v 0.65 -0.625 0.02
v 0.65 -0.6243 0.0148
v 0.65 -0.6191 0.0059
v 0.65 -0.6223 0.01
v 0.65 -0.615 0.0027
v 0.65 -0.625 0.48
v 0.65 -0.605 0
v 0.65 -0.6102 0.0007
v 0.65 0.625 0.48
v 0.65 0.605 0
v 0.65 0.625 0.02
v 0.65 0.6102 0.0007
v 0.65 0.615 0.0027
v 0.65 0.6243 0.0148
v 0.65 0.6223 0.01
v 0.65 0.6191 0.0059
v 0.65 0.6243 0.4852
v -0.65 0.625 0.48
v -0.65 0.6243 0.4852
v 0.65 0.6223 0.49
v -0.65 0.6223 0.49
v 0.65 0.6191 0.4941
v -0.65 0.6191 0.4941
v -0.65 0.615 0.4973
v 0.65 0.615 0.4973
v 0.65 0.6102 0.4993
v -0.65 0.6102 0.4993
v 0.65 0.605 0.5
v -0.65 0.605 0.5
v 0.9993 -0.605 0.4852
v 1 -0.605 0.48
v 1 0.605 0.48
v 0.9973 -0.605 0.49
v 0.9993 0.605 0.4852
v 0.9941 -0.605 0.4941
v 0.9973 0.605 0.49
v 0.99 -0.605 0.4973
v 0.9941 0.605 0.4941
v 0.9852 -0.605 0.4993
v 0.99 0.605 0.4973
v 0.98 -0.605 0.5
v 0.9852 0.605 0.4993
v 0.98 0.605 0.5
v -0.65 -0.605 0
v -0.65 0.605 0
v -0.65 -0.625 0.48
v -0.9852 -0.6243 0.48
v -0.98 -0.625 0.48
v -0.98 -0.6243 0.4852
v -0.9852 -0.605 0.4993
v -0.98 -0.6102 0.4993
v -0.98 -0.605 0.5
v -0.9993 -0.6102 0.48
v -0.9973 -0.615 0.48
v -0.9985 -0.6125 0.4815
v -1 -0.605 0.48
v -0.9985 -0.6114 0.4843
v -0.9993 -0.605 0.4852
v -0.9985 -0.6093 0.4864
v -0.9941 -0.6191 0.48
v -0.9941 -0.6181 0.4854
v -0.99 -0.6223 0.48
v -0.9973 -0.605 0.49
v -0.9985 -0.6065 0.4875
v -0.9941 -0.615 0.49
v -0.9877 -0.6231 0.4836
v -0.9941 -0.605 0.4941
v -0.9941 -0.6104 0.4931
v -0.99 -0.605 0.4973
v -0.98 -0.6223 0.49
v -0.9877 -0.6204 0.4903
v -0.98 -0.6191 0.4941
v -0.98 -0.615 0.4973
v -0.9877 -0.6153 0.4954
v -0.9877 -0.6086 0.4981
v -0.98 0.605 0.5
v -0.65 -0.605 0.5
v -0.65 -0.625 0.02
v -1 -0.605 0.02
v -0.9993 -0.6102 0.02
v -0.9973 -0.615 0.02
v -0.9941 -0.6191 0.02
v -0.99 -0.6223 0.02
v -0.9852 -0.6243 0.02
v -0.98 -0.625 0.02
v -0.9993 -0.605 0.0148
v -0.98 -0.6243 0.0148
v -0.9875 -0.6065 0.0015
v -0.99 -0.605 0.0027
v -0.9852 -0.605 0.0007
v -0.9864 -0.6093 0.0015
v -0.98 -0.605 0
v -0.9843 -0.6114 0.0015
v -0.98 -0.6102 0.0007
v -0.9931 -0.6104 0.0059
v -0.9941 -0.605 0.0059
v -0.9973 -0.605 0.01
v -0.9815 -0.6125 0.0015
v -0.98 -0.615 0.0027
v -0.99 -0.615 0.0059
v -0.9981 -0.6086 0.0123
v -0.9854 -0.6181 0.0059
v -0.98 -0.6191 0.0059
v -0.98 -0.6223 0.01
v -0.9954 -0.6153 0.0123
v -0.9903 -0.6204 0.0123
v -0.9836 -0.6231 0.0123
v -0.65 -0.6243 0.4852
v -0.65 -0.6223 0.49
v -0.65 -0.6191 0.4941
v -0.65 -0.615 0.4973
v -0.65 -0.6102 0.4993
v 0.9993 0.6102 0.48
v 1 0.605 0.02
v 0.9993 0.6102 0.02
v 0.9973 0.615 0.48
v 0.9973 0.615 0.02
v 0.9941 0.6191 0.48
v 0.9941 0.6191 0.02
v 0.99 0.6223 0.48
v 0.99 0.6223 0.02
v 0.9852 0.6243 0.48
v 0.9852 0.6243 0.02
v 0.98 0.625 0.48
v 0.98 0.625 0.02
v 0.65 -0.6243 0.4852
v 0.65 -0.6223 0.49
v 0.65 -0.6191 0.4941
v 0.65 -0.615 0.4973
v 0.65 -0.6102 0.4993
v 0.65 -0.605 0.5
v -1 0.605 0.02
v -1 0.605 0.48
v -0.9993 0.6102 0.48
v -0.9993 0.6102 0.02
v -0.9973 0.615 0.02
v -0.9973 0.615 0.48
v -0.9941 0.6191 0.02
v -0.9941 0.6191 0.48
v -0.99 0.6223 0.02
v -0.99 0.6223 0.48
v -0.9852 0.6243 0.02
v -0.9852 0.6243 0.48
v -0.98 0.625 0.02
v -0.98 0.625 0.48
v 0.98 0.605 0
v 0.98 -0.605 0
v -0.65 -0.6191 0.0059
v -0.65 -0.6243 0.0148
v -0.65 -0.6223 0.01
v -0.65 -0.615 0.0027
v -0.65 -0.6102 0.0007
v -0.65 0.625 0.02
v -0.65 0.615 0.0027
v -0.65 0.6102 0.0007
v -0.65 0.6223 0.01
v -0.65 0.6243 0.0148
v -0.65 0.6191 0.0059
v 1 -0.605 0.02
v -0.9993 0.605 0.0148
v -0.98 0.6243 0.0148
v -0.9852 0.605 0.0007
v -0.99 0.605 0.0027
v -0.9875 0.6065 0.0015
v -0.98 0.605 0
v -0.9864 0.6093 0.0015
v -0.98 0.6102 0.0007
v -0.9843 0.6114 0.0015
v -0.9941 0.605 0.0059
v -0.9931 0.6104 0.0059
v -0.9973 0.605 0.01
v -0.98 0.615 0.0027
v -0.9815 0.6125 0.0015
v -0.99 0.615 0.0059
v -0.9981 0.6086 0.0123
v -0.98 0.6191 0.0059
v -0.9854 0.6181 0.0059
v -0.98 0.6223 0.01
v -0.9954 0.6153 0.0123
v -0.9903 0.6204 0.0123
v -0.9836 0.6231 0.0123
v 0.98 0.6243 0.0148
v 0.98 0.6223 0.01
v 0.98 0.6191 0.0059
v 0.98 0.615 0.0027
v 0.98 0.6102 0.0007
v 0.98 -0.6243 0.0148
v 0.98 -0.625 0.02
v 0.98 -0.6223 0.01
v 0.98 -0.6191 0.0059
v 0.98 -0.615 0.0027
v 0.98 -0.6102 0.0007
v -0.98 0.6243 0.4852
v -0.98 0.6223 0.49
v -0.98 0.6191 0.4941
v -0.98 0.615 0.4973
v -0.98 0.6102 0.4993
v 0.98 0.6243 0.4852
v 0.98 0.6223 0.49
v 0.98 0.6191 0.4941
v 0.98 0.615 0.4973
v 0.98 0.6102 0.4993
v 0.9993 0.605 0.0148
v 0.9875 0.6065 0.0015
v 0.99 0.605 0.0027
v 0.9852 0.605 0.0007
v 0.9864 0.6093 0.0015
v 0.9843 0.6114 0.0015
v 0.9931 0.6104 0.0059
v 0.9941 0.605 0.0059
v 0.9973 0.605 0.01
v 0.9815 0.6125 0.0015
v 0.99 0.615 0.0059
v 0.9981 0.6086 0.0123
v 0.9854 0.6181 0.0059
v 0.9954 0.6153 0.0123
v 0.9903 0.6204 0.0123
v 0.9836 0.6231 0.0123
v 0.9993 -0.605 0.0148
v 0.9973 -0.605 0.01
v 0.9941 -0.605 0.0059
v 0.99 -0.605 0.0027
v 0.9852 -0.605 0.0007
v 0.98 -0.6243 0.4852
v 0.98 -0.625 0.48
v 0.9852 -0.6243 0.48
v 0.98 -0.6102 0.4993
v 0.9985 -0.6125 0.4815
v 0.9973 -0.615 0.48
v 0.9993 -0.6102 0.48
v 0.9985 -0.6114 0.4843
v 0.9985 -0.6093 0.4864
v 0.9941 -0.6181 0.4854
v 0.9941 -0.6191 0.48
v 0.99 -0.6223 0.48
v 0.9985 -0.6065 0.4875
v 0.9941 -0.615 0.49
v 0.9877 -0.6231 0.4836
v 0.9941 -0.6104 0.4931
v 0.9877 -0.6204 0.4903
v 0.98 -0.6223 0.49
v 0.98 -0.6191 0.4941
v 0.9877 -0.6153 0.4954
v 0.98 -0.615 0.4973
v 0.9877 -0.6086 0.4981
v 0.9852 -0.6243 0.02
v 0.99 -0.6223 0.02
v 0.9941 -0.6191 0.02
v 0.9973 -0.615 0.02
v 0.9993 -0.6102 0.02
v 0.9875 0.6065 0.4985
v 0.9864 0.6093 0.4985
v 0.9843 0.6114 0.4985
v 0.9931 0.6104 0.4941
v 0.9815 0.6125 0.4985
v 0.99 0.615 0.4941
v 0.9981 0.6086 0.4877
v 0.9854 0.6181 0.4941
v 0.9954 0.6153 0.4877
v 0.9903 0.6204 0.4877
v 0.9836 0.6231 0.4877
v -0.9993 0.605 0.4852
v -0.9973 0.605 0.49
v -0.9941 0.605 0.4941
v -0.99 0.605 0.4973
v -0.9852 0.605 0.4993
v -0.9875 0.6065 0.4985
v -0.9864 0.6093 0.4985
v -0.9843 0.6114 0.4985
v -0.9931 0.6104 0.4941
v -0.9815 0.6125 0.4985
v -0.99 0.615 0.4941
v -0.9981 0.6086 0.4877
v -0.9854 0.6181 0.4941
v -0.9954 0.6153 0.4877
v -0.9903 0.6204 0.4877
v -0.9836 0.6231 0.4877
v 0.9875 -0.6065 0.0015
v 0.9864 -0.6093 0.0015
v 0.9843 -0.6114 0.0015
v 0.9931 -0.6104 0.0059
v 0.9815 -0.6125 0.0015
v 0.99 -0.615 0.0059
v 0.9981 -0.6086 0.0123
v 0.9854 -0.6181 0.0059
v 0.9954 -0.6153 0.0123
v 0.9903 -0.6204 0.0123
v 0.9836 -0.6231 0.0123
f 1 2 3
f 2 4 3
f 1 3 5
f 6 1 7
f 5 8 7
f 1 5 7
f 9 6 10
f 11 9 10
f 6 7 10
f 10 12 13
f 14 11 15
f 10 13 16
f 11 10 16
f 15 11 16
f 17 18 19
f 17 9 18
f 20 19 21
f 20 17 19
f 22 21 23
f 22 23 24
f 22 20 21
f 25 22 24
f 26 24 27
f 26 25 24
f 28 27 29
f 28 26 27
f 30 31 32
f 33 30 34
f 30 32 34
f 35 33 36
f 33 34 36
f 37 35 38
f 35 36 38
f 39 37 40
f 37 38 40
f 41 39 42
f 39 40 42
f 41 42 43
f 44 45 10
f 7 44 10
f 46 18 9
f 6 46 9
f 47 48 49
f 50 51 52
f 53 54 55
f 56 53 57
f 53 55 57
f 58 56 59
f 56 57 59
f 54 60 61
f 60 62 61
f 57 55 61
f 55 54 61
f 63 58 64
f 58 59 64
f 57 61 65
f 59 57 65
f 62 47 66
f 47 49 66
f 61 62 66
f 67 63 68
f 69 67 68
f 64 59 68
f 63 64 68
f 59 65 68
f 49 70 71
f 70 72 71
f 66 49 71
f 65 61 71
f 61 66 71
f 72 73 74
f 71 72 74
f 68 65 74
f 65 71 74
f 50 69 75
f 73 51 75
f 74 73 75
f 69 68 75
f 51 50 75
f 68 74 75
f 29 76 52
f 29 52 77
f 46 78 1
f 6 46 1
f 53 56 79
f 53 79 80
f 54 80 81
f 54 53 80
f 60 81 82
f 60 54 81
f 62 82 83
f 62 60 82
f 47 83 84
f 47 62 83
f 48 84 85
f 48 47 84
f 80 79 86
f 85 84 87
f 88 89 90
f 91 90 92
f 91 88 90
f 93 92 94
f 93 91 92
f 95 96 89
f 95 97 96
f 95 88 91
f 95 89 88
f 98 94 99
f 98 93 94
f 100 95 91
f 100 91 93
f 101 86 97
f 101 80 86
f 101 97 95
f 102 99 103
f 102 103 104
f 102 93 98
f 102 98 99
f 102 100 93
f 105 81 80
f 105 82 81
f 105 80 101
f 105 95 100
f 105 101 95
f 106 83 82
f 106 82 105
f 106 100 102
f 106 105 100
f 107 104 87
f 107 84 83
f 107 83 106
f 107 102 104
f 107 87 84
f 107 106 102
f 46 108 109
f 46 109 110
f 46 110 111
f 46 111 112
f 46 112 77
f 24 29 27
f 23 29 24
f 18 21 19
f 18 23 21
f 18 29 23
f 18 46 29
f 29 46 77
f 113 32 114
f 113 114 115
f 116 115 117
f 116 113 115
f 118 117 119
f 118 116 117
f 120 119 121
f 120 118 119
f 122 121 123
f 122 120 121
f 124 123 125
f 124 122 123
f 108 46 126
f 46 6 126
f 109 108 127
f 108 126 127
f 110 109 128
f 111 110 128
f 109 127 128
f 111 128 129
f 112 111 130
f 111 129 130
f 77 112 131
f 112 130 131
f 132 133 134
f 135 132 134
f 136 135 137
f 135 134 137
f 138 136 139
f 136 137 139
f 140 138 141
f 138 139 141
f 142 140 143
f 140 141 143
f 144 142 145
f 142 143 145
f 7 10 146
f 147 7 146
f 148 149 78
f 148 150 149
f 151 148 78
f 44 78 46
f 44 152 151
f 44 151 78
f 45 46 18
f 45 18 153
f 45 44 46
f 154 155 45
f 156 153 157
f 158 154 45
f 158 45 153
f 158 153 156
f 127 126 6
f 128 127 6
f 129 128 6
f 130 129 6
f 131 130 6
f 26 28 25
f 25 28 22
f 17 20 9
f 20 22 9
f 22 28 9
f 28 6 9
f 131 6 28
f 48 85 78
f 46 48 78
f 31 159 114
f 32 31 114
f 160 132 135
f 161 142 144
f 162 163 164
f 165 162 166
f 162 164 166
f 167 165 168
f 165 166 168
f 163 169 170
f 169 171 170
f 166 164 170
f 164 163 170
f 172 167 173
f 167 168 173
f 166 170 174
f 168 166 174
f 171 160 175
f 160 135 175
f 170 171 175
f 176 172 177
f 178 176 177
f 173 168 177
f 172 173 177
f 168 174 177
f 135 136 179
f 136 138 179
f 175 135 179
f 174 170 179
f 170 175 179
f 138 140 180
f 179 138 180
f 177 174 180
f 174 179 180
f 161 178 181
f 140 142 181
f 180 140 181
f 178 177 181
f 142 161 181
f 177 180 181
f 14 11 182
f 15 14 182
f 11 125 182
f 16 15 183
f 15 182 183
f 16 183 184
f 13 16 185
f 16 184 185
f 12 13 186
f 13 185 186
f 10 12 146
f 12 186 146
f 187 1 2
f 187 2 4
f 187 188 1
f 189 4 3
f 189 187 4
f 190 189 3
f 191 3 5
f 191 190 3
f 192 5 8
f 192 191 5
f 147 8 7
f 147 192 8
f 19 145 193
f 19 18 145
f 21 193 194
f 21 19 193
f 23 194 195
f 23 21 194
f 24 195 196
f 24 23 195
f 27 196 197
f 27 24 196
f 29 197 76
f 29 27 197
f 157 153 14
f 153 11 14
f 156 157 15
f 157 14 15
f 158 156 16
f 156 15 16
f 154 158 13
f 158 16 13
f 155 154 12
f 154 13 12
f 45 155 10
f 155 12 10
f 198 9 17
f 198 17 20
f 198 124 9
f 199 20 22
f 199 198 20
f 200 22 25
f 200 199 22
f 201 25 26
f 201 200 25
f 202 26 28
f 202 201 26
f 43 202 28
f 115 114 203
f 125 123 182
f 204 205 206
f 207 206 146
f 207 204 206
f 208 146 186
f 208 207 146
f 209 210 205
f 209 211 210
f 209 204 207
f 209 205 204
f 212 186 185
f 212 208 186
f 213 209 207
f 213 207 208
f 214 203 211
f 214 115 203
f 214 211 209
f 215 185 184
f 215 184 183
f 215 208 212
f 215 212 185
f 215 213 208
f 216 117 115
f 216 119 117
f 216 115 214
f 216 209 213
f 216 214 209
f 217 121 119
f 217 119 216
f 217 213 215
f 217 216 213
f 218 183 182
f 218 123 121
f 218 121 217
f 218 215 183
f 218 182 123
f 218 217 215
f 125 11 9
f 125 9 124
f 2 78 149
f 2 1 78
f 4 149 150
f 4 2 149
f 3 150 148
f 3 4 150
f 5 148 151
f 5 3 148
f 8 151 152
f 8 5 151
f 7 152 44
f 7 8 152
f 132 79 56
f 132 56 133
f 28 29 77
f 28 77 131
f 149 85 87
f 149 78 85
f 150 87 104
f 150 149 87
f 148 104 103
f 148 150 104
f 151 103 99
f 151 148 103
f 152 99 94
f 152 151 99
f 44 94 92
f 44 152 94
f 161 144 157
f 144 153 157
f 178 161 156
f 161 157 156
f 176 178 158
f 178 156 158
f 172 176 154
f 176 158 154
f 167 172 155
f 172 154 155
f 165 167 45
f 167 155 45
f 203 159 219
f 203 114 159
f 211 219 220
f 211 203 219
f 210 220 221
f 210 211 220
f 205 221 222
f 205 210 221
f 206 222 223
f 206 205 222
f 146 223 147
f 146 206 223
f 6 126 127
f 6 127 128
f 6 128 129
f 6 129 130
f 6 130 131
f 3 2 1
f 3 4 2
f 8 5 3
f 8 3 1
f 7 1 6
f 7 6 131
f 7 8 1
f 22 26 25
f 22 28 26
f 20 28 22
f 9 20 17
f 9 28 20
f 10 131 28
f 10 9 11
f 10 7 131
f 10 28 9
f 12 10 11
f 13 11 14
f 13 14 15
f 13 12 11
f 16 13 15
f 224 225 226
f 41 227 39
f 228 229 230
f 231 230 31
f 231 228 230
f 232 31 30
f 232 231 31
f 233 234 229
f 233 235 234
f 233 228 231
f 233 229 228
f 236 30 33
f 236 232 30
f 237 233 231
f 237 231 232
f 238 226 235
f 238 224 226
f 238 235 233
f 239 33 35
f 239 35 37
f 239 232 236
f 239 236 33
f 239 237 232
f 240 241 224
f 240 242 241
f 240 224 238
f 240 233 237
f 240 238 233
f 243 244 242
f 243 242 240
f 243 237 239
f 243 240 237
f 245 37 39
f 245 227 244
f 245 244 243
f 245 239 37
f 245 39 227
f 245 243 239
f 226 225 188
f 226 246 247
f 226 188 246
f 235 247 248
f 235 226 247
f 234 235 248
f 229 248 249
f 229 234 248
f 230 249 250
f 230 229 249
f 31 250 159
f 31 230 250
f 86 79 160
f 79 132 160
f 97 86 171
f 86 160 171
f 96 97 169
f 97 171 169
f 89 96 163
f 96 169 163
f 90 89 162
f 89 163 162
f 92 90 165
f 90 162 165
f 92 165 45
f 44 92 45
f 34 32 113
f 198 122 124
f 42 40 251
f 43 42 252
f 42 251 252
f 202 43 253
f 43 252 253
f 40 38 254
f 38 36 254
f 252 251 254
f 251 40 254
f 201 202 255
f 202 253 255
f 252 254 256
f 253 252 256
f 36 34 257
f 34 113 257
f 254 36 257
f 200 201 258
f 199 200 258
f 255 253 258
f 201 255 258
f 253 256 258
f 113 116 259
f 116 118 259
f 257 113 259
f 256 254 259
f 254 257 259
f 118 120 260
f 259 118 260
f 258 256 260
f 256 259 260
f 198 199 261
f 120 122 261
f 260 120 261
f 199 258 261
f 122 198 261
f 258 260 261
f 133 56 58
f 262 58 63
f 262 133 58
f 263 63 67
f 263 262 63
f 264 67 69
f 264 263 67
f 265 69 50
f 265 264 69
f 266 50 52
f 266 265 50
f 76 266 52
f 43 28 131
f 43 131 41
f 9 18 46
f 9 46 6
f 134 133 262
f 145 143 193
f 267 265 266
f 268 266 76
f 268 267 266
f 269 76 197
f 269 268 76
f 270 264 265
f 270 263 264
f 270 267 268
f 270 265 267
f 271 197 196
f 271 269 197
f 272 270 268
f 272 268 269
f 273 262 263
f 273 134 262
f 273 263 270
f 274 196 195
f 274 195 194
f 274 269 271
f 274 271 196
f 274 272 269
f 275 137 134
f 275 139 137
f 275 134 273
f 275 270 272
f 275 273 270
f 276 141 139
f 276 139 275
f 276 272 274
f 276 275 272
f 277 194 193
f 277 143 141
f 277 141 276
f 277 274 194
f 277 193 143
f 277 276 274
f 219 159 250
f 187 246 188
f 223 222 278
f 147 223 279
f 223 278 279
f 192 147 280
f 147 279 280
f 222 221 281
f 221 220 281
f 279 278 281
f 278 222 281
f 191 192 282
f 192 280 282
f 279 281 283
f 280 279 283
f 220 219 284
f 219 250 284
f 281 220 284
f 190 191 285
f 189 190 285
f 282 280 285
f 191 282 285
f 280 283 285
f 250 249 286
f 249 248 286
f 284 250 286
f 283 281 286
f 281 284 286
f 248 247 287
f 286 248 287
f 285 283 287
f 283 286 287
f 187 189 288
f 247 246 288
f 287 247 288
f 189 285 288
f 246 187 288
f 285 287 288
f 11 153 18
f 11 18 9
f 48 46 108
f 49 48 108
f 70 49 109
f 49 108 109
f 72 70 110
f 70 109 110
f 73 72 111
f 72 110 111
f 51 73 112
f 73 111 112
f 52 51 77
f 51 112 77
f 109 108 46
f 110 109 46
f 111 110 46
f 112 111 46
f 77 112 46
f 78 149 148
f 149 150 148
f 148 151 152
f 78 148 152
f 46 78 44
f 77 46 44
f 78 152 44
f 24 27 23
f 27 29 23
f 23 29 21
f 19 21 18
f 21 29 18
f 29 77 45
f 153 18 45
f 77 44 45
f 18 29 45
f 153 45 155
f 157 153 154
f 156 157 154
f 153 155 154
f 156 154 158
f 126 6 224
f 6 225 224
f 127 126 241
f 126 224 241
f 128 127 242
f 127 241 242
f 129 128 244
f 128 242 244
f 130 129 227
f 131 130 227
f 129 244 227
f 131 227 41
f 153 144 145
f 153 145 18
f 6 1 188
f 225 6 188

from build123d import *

# Parameters (mm, degrees)
F2_W     = 1.3
F2_H     = 1.25
F3_DEPTH = 0.48
F2_W_2   = 0.35
F4_DEPTH = 0.5
F5_DEPTH = 0.5
F6_DEPTH = 0.02
F7_R     = 0.01999
F7_2_R   = 0.01999
F7_3_R   = 0.01999
F7_4_R   = 0.01999


# Not quite as in the source:
# - a fillet or chamfer is up to 0.001 mm smaller than in the source, because OpenCascade refuses the exact size


with BuildPart() as f3:
    # F2 (on Top) → F3 (new body)
    with BuildSketch(Plane.XY):
        Rectangle(F2_W, F2_H)
    extrude(amount=F3_DEPTH)


with BuildPart() as f4:
    # F2 (on Top) → F4 (new body)
    with BuildSketch(Plane.XY):
        with Locations((-0.825, 0)):
            Rectangle(F2_W_2, F2_H)
    extrude(amount=F4_DEPTH)

    # F7 (radius 0.02 in the source; OpenCascade refuses exactly that, so slightly less here)
    f7_edges = [f4.edges().sort_by_distance(p)[0] for p in [
        (-0.825, -0.625, 0.5),
        (-1, 0.625, 0.25),
        (-1, -0.625, 0.25),
        (-1, 0, 0),
        (-1, 0, 0.5),
        (-0.825, 0.625, 0.5),
        (-0.825, 0.625, 0),
        (-0.825, -0.625, 0),
    ]]
    fillet(f7_edges, radius=F7_R)


with BuildPart() as f5:
    # F2 (on Top) → F5 (new body)
    with BuildSketch(Plane.XY):
        with Locations((0.825, 0)):
            Rectangle(F2_W_2, F2_H)
    extrude(amount=F5_DEPTH)

    # F7#2 (radius 0.02 in the source; OpenCascade refuses exactly that, so slightly less here)
    f7_2_edges = [f5.edges().sort_by_distance(p)[0] for p in [
        (0.825, -0.625, 0.5),
        (1, -0.625, 0.25),
        (1, 0.625, 0.25),
        (1, 0, 0),
        (1, 0, 0.5),
        (0.825, 0.625, 0.5),
        (0.825, 0.625, 0),
        (0.825, -0.625, 0),
    ]]
    fillet(f7_2_edges, radius=F7_2_R)


with BuildPart() as f6:
    # F6 (new): a face of the model
    f6_faces = [f3.part.faces().sort_by_distance(p)[0] for p in [
        (0, 0, 0.48),
    ]]
    extrude(f6_faces, amount=F6_DEPTH)

    # F7#4 (radius 0.02 in the source; OpenCascade refuses exactly that, so slightly less here)
    f7_4_edges = [f6.edges().sort_by_distance(p)[0] for p in [
        (0, -0.625, 0.5),
        (0, 0.625, 0.5),
    ]]
    fillet(f7_4_edges, radius=F7_4_R)


with BuildPart() as f3_1:
    add(f3.part)

    # F7#3 (radius 0.02 in the source; OpenCascade refuses exactly that, so slightly less here)
    f7_3_edges = [f3_1.edges().sort_by_distance(p)[0] for p in [
        (0, 0.625, 0),
        (0, -0.625, 0),
    ]]
    fillet(f7_3_edges, radius=F7_3_R)


solid = Compound([f4.part, f5.part, f6.part, f3_1.part])
